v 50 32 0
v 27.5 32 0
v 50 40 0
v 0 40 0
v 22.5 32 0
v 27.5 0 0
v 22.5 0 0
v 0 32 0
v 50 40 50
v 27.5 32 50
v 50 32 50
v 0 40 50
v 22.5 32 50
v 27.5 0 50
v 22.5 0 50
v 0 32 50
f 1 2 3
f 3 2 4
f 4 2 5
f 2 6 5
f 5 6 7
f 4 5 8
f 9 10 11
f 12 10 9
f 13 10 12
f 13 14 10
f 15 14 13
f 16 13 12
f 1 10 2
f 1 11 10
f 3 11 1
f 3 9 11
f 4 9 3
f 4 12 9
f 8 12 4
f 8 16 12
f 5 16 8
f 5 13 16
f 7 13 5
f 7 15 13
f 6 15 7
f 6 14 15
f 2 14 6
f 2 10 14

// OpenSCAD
$fn = 32;

// ----------------------------------------------------------------------
// Structural section: tee 50 x 40 mm
// ----------------------------------------------------------------------

// --- parameters (mm) ---
sec_w = 50;               // tee width, X
sec_h = 40;               // tee height, Y
flange_t = 8;             // top flange thickness
web_t = 5;                // web thickness
plate_t = 50;             // cut length, Z (extrusion height)

profile = [[22.5, 0], [27.5, 0], [27.5, 32], [50, 32], [50, 40], [0, 40], [0, 32], [22.5, 32]];  // primary outline, 8 points, counter clockwise

// --- the one profile operation ---
linear_extrude(height = plate_t) polygon(points = profile);
